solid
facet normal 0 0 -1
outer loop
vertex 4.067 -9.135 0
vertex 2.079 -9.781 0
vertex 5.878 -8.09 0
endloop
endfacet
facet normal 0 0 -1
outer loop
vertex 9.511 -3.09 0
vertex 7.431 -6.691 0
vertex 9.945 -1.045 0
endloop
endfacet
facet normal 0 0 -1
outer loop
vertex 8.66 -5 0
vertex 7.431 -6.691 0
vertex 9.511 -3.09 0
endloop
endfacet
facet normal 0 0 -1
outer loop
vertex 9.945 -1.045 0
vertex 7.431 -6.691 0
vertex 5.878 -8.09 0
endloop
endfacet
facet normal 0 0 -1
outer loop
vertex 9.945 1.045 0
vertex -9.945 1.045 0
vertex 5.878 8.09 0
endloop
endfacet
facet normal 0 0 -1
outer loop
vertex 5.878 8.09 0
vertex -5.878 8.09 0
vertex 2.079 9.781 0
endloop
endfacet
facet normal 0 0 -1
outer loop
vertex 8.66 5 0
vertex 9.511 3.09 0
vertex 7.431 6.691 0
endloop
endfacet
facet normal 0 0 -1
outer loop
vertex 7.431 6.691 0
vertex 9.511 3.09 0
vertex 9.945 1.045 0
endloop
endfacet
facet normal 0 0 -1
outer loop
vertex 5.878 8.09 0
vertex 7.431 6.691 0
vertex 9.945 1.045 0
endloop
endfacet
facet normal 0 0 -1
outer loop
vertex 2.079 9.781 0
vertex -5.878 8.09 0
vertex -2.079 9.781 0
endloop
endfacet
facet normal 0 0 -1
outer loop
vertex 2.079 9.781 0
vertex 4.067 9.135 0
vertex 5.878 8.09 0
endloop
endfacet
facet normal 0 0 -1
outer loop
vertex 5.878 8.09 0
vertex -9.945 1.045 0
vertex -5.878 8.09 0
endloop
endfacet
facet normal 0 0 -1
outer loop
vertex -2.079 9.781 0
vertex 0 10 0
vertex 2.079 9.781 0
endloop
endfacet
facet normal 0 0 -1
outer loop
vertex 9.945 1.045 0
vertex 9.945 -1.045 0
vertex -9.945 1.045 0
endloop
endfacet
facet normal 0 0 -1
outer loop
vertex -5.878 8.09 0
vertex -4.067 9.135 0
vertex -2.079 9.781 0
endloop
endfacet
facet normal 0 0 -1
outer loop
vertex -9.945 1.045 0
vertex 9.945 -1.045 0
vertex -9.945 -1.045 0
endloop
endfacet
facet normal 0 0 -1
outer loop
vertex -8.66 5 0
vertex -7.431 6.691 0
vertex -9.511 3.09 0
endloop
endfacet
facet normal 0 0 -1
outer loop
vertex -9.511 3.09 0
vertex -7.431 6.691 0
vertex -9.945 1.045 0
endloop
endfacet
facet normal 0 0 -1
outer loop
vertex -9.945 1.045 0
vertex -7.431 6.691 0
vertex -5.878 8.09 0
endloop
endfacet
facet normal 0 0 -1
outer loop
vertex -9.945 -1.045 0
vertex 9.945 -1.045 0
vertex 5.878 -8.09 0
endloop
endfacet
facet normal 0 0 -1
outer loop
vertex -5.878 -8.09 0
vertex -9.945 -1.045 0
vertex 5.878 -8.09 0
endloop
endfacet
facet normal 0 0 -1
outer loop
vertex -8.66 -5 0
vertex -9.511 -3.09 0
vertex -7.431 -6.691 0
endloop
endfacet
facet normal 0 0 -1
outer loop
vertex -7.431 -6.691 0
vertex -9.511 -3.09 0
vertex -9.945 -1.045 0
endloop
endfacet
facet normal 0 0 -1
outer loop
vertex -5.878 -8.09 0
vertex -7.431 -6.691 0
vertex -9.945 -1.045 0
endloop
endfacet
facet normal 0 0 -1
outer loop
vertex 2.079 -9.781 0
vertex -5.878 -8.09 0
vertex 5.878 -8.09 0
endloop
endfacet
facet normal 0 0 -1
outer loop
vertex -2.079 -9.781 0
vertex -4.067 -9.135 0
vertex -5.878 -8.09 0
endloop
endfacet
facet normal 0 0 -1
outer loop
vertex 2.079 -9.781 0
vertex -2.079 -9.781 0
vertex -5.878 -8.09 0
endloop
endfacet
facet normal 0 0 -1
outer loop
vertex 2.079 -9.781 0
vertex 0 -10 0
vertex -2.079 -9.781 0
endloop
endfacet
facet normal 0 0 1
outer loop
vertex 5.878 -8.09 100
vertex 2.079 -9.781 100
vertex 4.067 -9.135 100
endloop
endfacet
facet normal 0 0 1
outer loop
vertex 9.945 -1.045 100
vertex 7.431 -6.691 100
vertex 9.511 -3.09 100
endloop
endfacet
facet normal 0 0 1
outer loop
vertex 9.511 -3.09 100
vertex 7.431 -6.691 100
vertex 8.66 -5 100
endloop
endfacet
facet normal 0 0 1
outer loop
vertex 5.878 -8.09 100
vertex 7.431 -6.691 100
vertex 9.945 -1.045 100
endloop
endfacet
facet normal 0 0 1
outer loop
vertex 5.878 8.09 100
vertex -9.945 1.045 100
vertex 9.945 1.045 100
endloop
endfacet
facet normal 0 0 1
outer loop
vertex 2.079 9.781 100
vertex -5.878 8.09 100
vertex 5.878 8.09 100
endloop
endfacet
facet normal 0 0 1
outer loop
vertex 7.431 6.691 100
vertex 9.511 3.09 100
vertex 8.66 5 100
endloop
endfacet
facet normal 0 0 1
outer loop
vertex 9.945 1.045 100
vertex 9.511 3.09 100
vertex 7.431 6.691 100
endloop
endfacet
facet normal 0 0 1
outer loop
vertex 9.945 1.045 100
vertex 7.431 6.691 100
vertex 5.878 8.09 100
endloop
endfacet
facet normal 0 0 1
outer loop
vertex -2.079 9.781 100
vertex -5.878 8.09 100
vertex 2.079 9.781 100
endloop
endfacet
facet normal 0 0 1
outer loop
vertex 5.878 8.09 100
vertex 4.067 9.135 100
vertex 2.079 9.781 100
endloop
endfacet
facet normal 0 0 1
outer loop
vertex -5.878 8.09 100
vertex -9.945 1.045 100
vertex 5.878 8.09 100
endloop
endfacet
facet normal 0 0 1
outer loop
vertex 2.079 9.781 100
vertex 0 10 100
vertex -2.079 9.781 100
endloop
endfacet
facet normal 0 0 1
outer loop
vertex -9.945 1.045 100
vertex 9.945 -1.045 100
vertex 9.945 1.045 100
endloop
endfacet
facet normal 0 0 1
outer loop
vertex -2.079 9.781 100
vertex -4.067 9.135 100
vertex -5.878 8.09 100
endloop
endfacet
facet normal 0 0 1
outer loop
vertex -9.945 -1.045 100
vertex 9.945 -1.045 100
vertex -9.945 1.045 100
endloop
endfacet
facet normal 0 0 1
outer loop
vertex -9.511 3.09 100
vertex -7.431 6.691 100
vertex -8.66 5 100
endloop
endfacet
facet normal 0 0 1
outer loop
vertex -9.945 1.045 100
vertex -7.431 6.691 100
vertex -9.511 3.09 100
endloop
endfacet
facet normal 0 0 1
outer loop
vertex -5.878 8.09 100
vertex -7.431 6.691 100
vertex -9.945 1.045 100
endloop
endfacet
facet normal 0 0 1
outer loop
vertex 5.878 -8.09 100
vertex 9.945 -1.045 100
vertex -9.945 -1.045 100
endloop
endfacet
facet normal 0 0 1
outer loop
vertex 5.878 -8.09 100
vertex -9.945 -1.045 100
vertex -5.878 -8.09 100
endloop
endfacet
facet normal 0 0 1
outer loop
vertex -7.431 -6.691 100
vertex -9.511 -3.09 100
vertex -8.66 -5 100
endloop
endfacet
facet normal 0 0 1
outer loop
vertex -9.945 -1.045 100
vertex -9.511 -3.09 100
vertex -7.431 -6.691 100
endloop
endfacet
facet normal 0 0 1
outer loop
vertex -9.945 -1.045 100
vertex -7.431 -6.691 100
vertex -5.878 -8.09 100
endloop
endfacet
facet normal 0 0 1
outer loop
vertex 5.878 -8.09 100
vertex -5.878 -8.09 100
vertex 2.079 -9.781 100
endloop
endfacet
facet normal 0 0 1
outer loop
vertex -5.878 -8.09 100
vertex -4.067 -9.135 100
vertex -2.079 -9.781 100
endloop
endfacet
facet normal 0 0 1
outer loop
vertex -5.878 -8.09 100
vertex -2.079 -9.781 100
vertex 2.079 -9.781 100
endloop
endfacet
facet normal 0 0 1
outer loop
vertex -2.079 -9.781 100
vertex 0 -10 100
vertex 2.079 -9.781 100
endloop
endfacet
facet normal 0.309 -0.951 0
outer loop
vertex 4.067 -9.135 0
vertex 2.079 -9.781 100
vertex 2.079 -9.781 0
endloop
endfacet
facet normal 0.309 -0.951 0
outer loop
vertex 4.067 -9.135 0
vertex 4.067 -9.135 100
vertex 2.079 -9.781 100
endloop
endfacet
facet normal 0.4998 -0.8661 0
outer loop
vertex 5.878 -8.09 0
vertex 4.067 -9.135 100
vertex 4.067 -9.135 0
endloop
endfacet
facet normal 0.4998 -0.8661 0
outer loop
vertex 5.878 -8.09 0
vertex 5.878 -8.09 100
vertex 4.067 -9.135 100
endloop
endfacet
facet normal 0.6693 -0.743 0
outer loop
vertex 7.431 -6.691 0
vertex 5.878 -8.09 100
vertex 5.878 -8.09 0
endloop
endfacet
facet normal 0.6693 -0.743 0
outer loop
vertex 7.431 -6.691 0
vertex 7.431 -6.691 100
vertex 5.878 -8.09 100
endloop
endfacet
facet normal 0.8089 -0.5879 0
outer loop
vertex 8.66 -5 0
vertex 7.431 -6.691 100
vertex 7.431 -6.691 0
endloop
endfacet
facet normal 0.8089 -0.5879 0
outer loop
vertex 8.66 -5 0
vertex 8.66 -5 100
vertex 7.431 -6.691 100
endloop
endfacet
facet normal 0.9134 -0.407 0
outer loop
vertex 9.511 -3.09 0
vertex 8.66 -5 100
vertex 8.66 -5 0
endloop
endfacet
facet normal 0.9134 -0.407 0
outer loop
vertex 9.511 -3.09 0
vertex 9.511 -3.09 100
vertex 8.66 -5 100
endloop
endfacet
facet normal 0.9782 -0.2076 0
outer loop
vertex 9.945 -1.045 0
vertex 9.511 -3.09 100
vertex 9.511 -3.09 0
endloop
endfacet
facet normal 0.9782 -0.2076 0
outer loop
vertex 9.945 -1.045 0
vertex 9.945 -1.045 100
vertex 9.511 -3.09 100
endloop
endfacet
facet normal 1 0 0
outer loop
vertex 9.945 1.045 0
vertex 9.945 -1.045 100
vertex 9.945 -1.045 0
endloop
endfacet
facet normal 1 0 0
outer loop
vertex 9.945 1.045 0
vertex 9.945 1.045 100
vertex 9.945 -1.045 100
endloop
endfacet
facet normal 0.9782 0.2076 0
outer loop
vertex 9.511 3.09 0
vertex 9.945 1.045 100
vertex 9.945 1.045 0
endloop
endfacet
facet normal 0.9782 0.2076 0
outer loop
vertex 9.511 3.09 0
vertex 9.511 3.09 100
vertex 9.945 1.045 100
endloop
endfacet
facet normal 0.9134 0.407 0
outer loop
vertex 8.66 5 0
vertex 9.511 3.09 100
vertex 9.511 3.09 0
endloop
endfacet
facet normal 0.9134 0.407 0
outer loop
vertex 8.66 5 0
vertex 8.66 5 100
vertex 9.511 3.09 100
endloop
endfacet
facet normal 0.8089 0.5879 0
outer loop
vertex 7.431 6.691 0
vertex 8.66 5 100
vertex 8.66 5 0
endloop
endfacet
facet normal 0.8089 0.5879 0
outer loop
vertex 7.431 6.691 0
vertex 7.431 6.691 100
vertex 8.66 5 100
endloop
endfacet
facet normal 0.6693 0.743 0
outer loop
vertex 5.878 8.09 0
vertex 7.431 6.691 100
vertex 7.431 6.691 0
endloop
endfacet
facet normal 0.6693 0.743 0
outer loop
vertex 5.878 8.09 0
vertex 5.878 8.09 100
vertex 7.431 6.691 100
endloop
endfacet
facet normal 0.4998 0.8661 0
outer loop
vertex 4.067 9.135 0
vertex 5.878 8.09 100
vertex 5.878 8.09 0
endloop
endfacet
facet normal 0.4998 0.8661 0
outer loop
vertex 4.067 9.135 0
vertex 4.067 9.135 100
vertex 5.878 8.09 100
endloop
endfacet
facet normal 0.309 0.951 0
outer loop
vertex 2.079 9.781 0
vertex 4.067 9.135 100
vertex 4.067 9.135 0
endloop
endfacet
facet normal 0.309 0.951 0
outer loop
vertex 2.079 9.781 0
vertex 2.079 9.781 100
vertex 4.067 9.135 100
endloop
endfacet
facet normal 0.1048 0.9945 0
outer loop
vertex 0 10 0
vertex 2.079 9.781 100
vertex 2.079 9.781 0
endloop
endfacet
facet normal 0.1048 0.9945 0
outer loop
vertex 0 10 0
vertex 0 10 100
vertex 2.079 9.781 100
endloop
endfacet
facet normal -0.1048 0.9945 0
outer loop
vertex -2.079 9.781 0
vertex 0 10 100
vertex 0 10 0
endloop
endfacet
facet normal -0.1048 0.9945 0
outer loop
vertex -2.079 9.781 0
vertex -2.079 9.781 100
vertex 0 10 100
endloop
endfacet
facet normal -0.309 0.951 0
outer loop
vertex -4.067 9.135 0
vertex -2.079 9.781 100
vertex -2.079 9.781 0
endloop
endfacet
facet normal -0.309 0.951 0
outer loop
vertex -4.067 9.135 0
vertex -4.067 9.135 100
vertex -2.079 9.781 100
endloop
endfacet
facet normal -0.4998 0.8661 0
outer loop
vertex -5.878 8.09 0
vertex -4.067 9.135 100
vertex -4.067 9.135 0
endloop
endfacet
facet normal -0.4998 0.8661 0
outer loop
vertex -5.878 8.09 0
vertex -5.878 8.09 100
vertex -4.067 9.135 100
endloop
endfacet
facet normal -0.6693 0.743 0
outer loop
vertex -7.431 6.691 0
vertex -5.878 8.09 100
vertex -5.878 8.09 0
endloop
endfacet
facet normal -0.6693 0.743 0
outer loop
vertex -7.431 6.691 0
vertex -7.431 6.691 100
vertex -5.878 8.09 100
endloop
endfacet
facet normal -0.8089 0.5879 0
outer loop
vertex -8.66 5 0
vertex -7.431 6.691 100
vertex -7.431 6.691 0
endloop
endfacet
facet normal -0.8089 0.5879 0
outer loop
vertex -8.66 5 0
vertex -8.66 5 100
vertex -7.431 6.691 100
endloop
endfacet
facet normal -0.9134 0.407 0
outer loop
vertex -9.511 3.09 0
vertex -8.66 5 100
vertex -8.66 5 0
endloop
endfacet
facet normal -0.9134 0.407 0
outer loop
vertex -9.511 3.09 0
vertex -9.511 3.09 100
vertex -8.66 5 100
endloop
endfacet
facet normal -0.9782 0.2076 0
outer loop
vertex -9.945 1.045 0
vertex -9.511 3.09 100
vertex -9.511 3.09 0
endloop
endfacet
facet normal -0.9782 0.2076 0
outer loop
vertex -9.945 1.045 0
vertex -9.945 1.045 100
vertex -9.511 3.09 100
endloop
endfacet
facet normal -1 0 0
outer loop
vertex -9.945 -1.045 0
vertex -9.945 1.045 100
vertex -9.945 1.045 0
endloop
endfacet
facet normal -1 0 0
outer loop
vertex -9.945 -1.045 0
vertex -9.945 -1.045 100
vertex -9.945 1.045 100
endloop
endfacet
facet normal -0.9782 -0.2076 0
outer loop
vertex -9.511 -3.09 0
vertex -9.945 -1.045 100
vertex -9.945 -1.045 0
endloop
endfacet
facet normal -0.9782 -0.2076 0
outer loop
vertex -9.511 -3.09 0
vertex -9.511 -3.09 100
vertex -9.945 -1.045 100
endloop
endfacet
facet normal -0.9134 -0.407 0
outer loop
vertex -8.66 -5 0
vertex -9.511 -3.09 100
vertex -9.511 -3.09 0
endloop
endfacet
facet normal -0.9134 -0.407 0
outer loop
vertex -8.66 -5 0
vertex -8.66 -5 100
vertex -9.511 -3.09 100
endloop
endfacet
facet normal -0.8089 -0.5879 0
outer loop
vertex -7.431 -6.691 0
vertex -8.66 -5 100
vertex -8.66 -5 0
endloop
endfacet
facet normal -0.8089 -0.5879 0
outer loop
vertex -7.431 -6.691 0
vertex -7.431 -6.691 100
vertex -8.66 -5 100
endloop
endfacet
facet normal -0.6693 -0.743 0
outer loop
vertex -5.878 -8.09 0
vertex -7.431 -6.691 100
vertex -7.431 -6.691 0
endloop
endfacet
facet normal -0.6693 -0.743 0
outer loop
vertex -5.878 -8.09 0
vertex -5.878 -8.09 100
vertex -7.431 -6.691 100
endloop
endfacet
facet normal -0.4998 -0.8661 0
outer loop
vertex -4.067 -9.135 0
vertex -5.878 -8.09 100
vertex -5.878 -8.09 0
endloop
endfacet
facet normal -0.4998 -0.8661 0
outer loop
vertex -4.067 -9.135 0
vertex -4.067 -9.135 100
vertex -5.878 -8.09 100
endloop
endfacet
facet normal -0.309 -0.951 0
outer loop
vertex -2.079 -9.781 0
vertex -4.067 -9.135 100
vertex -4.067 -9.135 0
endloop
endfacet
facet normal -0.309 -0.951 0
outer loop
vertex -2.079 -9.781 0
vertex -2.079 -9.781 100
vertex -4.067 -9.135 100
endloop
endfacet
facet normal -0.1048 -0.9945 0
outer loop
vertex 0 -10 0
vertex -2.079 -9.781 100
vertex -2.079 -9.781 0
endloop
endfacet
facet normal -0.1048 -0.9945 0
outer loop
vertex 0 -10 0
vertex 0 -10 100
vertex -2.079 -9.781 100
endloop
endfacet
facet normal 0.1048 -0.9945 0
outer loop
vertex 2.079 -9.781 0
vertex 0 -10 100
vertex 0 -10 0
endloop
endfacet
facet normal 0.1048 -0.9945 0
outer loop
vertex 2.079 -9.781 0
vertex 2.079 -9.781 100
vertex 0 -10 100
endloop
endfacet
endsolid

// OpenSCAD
cylinder(10);
GRID_FINE=0.000001;
M_PI=3.14159265358979323846;

function getFragments(r,fn,fs,fa) =
 (r < GRID_FINE)?3:
 (fn > 0.0)?(fn >= 3 ? fn : 3):
 ceil(max(min(360.0 / fa, r*2*M_PI / fs), 5));

function getPhi(i,f) = (i*360)/f;
function getCircle_x(r,i,f) = r*sin(getPhi(i,f));
function getCircle_y(r,i,f) = r*cos(getPhi(i,f));

function getCircle(r,f,i=0,points=[]) = (
i>=f?points : getCircle(r,f,i+1,concat(points,[[getCircle_x(r,i,f),getCircle_y(r,i,f)]]))
);

function getRange(start,finish,v=[]) = len(v)>finish?v:getRange(start+1,finish,concat(v,start));

function toVector(v,size) = len(v)==undef?toVector([v],size):len(v)>=size?v:toVector(concat(v,v[0]),size);

module circle(r,approx="outer") {
 f=getFragments(r,$fn,$fs,$fa);
 if(approx=="inner") {
  assign(apothem=radius*cos(360/f)) {
   polygon(getCircle(apothem,f),[getRange(0,f)]);
  }
 } else {
  polygon(getCircle(r,f),[getRange(0,f)]);
 }
}

module cylinder(r,h,center,approx) {
 linear_extrude(height=h, center = center) circle(r,approx);
}

module sphere(r)
{
 f=getFragments(r,$fn,$fs,$fa);
 points=getCircle(r,f);
 rotate_extrude()polygon(points,[getRange(0,f/2)]);
}

module rotate(v)
{

 function cos_n(a) = a%90?cos(a):round(cos(a));
 function sin_n(a) = a%90?sin(a):round(sin(a));

 cx = cos_n(v[0]);
 cy = cos_n(v[1]);
 cz = cos_n(v[2]);
 sx = sin_n(v[0]);
 sy = sin_n(v[1]);
 sz = sin_n(v[2]);
 multmatrix([
  [cy*cz,cz*sx*sy-cx*sz,cx*cz*sy+sx*sz,0],
  [cy*sz,cx*cz+sx*sy*sz,-cz*sx+cx*sy*sz,0],
  [-sy,cy*sx,cx*cy,0],
  [0,0,0,1]
 ])children();
}

module translate(v)
{
 multmatrix([
  [1,0,0,v[0]],
  [0,1,0,v[1]],
  [0,0,1,v[2]],
  [0,0,0,1]
 ])children();
}

module scale(size,reference=[0,0,0])
{
 x=size[0];
 y=size[1];
 z=size[2];
 a=reference[0];
 b=reference[1];
 c=reference[2];
 multmatrix([
  [x,0,0,a-(a*x)],
  [0,y,0,b-(b*x)],
  [0,0,z,c-(c*x)],
  [0,0,0,1]
 ])children();
}

module mirror(v)
{
 x=v[0];
 y=v[1];
 z=v[2];
 mag = sqrt(x*x + y*y + z*z);
 u = x/mag;
 v = y/mag;
 w = z/mag;
 multmatrix([
  [1-2*u*u,-2*v*u,-2*w*u,0],
  [-2*u*v,1-2*v*v,-2*w*v,0],
  [-2*u*w,-2*v*w,1-2*w*w,0],
  [0,0,0,1]
  ])children();
}

module square(size,center=false) {
  module square_impl(x1,y1,x2,y2) {
    polygon([[x1,y1],[x1,y2],[x2,y2],[x2,y1]],[[0,1,2,3]]);
  }
 s=toVector(size,2);
 if(center)
   assign(
   x1 = -s[0]/2,
   x2 = +s[0]/2,
   y1 = -s[1]/2,
   y2 = +s[1]/2
   )square_impl(x1,y1,x2,y2);
  else
   assign(
    x1=0,
    y1=0,
    x2=s[0],
    y2=s[1]
   )square_impl(x1,y1,x2,y2);
}

module cube(size,center=false)
{
  s=toVector(size,3);
  h=s[2];
  if(center)
   translate([0,0,-h/2])linear_extrude(height=h)square(s,center);
  else
   linear_extrude(height=h)square(s,center);
}
